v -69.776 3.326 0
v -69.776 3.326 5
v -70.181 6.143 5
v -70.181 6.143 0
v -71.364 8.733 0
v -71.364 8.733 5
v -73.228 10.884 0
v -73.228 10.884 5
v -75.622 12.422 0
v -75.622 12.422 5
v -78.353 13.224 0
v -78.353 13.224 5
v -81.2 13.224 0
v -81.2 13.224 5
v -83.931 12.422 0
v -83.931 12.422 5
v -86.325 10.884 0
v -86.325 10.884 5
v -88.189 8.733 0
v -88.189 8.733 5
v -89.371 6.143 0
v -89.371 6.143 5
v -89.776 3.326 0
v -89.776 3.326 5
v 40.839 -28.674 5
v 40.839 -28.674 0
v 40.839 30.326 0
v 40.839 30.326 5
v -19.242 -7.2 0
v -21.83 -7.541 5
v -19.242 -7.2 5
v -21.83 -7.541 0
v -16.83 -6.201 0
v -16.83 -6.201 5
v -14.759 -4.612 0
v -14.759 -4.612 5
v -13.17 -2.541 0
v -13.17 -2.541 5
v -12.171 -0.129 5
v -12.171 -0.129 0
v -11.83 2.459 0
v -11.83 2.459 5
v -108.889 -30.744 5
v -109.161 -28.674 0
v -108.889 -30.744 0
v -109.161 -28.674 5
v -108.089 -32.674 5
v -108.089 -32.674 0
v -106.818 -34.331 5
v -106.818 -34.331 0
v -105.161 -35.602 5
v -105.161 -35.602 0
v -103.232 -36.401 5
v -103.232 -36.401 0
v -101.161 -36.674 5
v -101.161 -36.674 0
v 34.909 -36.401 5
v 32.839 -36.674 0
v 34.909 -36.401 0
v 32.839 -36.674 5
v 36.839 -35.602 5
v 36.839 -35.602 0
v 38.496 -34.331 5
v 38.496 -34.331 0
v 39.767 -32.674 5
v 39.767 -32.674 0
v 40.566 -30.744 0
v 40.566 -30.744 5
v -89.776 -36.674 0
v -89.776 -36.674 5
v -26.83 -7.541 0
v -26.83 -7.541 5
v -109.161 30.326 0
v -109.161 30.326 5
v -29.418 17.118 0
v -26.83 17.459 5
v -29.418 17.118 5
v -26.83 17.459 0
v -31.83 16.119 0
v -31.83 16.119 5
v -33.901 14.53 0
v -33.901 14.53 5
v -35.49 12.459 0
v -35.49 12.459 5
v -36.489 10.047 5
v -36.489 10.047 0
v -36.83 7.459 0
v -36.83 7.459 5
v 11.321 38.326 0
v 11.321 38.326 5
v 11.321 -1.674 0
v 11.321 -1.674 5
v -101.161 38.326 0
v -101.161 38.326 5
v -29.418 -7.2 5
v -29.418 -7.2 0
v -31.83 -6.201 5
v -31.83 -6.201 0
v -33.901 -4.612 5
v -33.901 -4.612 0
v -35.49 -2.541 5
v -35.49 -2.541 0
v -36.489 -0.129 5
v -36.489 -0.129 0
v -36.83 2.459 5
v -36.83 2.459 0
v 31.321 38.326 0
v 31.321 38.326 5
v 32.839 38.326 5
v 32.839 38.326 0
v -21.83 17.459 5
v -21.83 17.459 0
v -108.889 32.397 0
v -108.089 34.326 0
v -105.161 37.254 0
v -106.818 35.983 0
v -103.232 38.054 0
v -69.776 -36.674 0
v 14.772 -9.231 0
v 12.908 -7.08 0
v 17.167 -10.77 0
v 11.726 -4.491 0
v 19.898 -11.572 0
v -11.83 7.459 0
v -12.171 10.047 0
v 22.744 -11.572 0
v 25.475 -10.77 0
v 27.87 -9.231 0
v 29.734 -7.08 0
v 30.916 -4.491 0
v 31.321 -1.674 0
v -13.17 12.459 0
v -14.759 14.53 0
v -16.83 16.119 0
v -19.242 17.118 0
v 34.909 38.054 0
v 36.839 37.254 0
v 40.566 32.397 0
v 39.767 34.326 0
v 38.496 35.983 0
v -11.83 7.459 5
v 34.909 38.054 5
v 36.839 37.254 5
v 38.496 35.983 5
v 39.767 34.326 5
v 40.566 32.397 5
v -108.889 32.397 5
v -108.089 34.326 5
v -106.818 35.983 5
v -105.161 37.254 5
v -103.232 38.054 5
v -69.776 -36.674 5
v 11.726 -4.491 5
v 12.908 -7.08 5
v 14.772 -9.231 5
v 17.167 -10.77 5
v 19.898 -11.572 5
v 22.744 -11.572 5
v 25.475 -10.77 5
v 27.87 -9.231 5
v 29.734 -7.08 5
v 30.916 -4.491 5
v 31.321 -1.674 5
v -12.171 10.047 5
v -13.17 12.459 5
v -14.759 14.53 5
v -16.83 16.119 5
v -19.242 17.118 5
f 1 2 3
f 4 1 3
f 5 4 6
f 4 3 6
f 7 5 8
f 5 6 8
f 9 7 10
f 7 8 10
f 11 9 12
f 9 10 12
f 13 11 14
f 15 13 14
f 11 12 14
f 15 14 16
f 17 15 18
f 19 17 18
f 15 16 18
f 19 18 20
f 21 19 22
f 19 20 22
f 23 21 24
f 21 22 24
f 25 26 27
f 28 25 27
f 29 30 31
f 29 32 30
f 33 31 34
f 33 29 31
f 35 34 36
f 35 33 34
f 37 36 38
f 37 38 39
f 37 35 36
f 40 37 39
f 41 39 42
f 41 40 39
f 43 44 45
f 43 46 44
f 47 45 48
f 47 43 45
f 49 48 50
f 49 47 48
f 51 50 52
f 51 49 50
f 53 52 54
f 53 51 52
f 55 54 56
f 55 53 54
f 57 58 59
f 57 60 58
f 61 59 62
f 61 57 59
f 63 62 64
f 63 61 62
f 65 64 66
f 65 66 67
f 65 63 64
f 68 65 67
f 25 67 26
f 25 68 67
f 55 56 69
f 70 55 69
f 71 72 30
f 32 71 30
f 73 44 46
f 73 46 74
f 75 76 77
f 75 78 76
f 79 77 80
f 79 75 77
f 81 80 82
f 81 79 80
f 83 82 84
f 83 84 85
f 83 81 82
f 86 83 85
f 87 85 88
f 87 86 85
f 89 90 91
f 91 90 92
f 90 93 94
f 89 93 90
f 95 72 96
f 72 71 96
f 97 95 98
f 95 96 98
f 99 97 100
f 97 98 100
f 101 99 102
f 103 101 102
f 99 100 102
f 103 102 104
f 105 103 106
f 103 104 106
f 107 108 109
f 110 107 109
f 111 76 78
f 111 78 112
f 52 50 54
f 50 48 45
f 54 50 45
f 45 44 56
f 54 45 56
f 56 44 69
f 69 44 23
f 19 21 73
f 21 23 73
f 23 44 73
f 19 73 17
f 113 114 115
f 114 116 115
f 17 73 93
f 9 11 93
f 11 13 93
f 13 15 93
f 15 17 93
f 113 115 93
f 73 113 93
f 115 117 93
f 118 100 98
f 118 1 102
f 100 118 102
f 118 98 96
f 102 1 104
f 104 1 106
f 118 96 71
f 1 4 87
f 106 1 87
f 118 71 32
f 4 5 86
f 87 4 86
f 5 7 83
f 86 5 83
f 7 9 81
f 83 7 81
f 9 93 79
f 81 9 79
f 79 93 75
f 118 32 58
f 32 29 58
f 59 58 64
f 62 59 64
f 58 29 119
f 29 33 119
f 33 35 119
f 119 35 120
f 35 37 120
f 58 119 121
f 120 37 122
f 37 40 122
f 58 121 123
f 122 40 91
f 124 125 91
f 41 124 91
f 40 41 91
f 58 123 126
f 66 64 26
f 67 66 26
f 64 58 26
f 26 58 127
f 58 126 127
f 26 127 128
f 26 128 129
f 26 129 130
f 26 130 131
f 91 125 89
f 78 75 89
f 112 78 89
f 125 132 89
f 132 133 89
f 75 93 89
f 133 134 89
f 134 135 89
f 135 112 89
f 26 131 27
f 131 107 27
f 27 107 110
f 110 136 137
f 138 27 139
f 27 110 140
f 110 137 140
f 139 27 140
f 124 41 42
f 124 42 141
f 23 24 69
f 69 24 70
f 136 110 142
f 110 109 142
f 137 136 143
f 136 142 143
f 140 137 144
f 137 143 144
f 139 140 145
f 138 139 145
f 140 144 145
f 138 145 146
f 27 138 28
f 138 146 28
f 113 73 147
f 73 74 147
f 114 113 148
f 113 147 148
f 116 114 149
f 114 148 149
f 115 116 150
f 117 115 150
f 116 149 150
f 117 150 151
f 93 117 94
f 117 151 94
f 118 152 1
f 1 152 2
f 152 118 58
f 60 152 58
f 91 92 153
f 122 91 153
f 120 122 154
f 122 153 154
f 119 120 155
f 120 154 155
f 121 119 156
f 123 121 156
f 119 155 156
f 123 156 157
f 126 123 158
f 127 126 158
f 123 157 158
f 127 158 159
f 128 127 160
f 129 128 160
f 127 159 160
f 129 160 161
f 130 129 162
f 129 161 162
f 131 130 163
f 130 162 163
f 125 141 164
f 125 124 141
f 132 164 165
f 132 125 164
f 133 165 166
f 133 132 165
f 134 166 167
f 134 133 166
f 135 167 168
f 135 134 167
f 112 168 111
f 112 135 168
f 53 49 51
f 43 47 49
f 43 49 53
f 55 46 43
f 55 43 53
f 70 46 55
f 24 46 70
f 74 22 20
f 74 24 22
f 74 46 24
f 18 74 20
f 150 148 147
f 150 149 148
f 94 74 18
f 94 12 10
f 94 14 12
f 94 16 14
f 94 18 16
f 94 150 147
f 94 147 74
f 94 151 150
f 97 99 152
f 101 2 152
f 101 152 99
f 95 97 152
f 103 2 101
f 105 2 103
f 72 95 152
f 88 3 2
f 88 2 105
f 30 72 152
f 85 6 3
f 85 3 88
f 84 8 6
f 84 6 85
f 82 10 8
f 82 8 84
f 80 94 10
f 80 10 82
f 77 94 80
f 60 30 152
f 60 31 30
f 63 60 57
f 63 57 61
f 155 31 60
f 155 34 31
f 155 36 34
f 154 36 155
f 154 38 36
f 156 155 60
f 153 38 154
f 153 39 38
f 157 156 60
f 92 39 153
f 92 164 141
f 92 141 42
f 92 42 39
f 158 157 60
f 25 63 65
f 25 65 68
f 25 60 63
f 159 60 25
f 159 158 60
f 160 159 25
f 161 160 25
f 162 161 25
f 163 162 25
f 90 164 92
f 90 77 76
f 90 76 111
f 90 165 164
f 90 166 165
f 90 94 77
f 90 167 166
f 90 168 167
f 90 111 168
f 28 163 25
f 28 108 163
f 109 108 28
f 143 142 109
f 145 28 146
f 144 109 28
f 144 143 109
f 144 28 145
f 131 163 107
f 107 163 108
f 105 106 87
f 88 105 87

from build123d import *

# Parameters (mm, degrees)
F0_W     = 150
F0_H     = 75
F1_DEPTH = 5
F3_DEPTH = 5.001
F5_DEPTH = 5.001
F6_W     = 25
F6_H     = 25
F7_DEPTH = 5.001
F8_R     = 10
F9_R     = 8


with BuildPart() as f1:
    # F0 (on Top) → F1 (new body)
    with BuildSketch(Plane.XY):
        with Locations((-34.16129, 0.826124)):
            Rectangle(F0_W, F0_H)
    extrude(amount=F1_DEPTH)

    # F2 (on face) → F3 (cut, through all)
    with BuildSketch(Plane.XY.offset(5)):
        with BuildLine():
            Line((-89.776412, 3.326124), (-89.776412, -36.673876))
            Line((-89.776412, -36.673876), (-69.776412, -36.673876))
            Line((-69.776412, -36.673876), (-69.776412, 3.326124))
            ThreePointArc((-69.776412, 3.326124), (-79.776412, 13.326124), (-89.776412, 3.326124))
        make_face()
    extrude(amount=-F3_DEPTH, mode=Mode.SUBTRACT)

    # F4 (on face) → F5 (cut, through all)
    with BuildSketch(Plane.XY.offset(5)):
        with BuildLine():
            Line((31.320997, -1.673876), (31.320997, 38.326124))
            Line((31.320997, 38.326124), (11.320997, 38.326124))
            Line((11.320997, 38.326124), (11.320997, -1.673876))
            ThreePointArc((11.320997, -1.673876), (21.320997, -11.673876), (31.320997, -1.673876))
        make_face()
    extrude(amount=-F5_DEPTH, mode=Mode.SUBTRACT)

    # F6 (on face) → F7 (cut, through all)
    with BuildSketch(Plane.XY.offset(5)):
        with Locations((-24.330012, 4.958801)):
            Rectangle(F6_W, F6_H)
    extrude(amount=-F7_DEPTH, mode=Mode.SUBTRACT)

    # F8
    f8_edges = [f1.edges().sort_by_distance(p)[0] for p in [
        (-36.830012, -7.541199, 2.5),
        (-11.830012, -7.541199, 2.5),
        (-11.830012, 17.458801, 2.5),
        (-36.830012, 17.458801, 2.5),
    ]]
    fillet(f8_edges, radius=F8_R)

    # F9
    f9_edges = [f1.edges().sort_by_distance(p)[0] for p in [
        (40.83871, 38.326124, 2.5),
        (-109.16129, -36.673876, 2.5),
        (40.83871, -36.673876, 2.5),
        (-109.16129, 38.326124, 2.5),
    ]]
    fillet(f9_edges, radius=F9_R)


solid = f1.part
